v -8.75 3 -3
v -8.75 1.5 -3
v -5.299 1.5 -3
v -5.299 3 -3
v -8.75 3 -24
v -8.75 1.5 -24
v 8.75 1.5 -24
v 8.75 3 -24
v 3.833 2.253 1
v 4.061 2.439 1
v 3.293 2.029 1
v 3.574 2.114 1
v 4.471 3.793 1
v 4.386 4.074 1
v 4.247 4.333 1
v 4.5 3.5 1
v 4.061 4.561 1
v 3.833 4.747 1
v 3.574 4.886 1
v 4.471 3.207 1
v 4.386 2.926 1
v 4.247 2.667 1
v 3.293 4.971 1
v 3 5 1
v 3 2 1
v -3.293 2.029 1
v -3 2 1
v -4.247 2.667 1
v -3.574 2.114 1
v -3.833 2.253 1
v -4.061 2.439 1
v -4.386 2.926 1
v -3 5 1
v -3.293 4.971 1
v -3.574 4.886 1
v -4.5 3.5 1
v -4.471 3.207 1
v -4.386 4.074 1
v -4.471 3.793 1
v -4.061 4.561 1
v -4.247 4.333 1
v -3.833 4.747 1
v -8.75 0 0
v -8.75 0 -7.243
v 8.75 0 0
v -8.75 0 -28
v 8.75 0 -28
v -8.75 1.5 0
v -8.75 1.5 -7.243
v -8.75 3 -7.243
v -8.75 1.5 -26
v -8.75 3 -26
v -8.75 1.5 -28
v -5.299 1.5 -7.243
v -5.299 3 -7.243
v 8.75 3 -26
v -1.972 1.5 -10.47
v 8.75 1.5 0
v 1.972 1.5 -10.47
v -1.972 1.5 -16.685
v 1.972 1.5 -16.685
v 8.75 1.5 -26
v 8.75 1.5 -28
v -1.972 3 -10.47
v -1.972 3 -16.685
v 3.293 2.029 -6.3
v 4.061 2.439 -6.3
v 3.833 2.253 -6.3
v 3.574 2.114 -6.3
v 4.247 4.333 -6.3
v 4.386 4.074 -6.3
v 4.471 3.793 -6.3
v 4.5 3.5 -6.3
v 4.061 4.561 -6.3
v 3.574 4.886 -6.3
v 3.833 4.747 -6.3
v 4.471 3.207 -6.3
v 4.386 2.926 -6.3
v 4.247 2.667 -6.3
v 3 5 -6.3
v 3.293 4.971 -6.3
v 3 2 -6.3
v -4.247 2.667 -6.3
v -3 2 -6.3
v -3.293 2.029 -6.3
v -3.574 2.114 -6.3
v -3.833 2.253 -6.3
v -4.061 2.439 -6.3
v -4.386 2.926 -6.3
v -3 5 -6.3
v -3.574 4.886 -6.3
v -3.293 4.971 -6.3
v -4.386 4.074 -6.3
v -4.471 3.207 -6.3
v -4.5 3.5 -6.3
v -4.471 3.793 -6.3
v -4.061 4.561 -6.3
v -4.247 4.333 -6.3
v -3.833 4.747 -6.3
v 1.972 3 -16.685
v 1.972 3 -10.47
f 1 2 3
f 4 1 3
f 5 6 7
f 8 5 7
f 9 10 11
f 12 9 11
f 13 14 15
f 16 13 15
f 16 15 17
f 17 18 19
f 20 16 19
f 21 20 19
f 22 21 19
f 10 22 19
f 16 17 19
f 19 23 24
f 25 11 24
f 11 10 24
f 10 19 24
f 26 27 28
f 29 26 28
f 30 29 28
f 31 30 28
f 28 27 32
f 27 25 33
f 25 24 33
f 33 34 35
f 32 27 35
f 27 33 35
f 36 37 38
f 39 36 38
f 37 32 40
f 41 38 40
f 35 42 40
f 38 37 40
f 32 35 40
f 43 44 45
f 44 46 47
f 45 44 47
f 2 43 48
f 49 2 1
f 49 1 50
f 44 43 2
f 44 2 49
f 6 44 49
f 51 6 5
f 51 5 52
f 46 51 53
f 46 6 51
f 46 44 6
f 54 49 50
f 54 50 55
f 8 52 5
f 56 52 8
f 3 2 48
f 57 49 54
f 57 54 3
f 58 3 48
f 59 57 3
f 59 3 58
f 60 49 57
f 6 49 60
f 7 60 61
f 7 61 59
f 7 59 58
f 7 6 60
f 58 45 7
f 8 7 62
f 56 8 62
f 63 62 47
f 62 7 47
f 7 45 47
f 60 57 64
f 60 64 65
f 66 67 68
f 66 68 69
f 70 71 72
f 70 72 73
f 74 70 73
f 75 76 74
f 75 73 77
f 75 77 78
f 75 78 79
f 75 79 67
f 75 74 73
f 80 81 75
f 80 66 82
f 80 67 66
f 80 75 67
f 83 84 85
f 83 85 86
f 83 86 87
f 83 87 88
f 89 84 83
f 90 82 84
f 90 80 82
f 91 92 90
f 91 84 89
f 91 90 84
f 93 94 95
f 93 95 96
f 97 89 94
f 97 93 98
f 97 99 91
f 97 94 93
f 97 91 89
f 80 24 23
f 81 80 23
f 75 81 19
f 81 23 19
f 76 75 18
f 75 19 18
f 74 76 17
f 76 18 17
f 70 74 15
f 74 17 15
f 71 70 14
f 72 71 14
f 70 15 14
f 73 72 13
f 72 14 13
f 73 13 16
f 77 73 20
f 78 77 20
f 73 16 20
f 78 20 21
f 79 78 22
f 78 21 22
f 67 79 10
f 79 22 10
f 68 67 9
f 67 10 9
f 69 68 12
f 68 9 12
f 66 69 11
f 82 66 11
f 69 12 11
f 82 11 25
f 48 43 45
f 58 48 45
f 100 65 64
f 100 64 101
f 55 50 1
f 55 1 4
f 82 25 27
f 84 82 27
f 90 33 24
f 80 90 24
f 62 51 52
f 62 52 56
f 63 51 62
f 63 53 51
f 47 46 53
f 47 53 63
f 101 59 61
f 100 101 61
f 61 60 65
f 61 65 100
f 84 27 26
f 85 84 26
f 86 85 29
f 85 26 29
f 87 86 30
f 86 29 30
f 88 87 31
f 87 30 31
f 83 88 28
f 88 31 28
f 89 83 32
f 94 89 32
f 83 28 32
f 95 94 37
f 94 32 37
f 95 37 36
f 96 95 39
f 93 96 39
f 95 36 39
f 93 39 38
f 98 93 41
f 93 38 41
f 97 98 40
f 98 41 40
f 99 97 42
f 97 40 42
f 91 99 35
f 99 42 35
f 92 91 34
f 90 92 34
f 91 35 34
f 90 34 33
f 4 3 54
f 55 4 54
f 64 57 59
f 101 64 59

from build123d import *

# Parameters (mm, degrees)
SKETCH_1_W      = 17.5
SKETCH_1_H      = 28
EXTRUDE_1_DEPTH = 1.5
EXTRUDE_START   = 1
EXTRUDE_2_DEPTH = 7.3
SKETCH_3_W      = 3.944166636
SKETCH_3_H      = 6.215050456
SKETCH_3_W_2    = 3.451271085
SKETCH_3_H_2    = 4.243110314
SKETCH_3_W_3    = 17.5
SKETCH_3_H_3    = 2
EXTRUDE_3_DEPTH = 3


with BuildPart() as part:
    # Эскиз1 → Бобышка-Вытянуть1 (new body)
    with BuildSketch(Plane(origin=(0, 0, 0), x_dir=(1, 0, 0), z_dir=(0, 1, 0))):
        with Locations((0, 14)):
            Rectangle(SKETCH_1_W, SKETCH_1_H)
    extrude(amount=EXTRUDE_1_DEPTH)

    # Эскиз3 → Бобышка-Вытянуть3 (add)
    with BuildSketch(Plane(origin=(0, 0, 0), x_dir=(1, 0, 0), z_dir=(0, 1, 0))):
        with Locations((0, 13.577680972)):
            Rectangle(SKETCH_3_W, SKETCH_3_H)
        with Locations((-7.024364458, 5.121555157)):
            Rectangle(SKETCH_3_W_2, SKETCH_3_H_2)
        with Locations((0, 25)):
            Rectangle(SKETCH_3_W_3, SKETCH_3_H_3)
    extrude(amount=EXTRUDE_3_DEPTH)


with BuildPart() as body_2:
    # Эскиз2 → Бобышка-Вытянуть2 (new body)
    with BuildSketch(Plane.XY.offset(EXTRUDE_START)):
        with BuildLine():
            Line((-3, 5), (3, 5))
            ThreePointArc((3, 5), (4.5, 3.5), (3, 2))
            Line((3, 2), (-3, 2))
            ThreePointArc((-3, 2), (-4.5, 3.5), (-3, 5))
        make_face()
    extrude(amount=-EXTRUDE_2_DEPTH)


solid = Compound([part.part, body_2.part])
